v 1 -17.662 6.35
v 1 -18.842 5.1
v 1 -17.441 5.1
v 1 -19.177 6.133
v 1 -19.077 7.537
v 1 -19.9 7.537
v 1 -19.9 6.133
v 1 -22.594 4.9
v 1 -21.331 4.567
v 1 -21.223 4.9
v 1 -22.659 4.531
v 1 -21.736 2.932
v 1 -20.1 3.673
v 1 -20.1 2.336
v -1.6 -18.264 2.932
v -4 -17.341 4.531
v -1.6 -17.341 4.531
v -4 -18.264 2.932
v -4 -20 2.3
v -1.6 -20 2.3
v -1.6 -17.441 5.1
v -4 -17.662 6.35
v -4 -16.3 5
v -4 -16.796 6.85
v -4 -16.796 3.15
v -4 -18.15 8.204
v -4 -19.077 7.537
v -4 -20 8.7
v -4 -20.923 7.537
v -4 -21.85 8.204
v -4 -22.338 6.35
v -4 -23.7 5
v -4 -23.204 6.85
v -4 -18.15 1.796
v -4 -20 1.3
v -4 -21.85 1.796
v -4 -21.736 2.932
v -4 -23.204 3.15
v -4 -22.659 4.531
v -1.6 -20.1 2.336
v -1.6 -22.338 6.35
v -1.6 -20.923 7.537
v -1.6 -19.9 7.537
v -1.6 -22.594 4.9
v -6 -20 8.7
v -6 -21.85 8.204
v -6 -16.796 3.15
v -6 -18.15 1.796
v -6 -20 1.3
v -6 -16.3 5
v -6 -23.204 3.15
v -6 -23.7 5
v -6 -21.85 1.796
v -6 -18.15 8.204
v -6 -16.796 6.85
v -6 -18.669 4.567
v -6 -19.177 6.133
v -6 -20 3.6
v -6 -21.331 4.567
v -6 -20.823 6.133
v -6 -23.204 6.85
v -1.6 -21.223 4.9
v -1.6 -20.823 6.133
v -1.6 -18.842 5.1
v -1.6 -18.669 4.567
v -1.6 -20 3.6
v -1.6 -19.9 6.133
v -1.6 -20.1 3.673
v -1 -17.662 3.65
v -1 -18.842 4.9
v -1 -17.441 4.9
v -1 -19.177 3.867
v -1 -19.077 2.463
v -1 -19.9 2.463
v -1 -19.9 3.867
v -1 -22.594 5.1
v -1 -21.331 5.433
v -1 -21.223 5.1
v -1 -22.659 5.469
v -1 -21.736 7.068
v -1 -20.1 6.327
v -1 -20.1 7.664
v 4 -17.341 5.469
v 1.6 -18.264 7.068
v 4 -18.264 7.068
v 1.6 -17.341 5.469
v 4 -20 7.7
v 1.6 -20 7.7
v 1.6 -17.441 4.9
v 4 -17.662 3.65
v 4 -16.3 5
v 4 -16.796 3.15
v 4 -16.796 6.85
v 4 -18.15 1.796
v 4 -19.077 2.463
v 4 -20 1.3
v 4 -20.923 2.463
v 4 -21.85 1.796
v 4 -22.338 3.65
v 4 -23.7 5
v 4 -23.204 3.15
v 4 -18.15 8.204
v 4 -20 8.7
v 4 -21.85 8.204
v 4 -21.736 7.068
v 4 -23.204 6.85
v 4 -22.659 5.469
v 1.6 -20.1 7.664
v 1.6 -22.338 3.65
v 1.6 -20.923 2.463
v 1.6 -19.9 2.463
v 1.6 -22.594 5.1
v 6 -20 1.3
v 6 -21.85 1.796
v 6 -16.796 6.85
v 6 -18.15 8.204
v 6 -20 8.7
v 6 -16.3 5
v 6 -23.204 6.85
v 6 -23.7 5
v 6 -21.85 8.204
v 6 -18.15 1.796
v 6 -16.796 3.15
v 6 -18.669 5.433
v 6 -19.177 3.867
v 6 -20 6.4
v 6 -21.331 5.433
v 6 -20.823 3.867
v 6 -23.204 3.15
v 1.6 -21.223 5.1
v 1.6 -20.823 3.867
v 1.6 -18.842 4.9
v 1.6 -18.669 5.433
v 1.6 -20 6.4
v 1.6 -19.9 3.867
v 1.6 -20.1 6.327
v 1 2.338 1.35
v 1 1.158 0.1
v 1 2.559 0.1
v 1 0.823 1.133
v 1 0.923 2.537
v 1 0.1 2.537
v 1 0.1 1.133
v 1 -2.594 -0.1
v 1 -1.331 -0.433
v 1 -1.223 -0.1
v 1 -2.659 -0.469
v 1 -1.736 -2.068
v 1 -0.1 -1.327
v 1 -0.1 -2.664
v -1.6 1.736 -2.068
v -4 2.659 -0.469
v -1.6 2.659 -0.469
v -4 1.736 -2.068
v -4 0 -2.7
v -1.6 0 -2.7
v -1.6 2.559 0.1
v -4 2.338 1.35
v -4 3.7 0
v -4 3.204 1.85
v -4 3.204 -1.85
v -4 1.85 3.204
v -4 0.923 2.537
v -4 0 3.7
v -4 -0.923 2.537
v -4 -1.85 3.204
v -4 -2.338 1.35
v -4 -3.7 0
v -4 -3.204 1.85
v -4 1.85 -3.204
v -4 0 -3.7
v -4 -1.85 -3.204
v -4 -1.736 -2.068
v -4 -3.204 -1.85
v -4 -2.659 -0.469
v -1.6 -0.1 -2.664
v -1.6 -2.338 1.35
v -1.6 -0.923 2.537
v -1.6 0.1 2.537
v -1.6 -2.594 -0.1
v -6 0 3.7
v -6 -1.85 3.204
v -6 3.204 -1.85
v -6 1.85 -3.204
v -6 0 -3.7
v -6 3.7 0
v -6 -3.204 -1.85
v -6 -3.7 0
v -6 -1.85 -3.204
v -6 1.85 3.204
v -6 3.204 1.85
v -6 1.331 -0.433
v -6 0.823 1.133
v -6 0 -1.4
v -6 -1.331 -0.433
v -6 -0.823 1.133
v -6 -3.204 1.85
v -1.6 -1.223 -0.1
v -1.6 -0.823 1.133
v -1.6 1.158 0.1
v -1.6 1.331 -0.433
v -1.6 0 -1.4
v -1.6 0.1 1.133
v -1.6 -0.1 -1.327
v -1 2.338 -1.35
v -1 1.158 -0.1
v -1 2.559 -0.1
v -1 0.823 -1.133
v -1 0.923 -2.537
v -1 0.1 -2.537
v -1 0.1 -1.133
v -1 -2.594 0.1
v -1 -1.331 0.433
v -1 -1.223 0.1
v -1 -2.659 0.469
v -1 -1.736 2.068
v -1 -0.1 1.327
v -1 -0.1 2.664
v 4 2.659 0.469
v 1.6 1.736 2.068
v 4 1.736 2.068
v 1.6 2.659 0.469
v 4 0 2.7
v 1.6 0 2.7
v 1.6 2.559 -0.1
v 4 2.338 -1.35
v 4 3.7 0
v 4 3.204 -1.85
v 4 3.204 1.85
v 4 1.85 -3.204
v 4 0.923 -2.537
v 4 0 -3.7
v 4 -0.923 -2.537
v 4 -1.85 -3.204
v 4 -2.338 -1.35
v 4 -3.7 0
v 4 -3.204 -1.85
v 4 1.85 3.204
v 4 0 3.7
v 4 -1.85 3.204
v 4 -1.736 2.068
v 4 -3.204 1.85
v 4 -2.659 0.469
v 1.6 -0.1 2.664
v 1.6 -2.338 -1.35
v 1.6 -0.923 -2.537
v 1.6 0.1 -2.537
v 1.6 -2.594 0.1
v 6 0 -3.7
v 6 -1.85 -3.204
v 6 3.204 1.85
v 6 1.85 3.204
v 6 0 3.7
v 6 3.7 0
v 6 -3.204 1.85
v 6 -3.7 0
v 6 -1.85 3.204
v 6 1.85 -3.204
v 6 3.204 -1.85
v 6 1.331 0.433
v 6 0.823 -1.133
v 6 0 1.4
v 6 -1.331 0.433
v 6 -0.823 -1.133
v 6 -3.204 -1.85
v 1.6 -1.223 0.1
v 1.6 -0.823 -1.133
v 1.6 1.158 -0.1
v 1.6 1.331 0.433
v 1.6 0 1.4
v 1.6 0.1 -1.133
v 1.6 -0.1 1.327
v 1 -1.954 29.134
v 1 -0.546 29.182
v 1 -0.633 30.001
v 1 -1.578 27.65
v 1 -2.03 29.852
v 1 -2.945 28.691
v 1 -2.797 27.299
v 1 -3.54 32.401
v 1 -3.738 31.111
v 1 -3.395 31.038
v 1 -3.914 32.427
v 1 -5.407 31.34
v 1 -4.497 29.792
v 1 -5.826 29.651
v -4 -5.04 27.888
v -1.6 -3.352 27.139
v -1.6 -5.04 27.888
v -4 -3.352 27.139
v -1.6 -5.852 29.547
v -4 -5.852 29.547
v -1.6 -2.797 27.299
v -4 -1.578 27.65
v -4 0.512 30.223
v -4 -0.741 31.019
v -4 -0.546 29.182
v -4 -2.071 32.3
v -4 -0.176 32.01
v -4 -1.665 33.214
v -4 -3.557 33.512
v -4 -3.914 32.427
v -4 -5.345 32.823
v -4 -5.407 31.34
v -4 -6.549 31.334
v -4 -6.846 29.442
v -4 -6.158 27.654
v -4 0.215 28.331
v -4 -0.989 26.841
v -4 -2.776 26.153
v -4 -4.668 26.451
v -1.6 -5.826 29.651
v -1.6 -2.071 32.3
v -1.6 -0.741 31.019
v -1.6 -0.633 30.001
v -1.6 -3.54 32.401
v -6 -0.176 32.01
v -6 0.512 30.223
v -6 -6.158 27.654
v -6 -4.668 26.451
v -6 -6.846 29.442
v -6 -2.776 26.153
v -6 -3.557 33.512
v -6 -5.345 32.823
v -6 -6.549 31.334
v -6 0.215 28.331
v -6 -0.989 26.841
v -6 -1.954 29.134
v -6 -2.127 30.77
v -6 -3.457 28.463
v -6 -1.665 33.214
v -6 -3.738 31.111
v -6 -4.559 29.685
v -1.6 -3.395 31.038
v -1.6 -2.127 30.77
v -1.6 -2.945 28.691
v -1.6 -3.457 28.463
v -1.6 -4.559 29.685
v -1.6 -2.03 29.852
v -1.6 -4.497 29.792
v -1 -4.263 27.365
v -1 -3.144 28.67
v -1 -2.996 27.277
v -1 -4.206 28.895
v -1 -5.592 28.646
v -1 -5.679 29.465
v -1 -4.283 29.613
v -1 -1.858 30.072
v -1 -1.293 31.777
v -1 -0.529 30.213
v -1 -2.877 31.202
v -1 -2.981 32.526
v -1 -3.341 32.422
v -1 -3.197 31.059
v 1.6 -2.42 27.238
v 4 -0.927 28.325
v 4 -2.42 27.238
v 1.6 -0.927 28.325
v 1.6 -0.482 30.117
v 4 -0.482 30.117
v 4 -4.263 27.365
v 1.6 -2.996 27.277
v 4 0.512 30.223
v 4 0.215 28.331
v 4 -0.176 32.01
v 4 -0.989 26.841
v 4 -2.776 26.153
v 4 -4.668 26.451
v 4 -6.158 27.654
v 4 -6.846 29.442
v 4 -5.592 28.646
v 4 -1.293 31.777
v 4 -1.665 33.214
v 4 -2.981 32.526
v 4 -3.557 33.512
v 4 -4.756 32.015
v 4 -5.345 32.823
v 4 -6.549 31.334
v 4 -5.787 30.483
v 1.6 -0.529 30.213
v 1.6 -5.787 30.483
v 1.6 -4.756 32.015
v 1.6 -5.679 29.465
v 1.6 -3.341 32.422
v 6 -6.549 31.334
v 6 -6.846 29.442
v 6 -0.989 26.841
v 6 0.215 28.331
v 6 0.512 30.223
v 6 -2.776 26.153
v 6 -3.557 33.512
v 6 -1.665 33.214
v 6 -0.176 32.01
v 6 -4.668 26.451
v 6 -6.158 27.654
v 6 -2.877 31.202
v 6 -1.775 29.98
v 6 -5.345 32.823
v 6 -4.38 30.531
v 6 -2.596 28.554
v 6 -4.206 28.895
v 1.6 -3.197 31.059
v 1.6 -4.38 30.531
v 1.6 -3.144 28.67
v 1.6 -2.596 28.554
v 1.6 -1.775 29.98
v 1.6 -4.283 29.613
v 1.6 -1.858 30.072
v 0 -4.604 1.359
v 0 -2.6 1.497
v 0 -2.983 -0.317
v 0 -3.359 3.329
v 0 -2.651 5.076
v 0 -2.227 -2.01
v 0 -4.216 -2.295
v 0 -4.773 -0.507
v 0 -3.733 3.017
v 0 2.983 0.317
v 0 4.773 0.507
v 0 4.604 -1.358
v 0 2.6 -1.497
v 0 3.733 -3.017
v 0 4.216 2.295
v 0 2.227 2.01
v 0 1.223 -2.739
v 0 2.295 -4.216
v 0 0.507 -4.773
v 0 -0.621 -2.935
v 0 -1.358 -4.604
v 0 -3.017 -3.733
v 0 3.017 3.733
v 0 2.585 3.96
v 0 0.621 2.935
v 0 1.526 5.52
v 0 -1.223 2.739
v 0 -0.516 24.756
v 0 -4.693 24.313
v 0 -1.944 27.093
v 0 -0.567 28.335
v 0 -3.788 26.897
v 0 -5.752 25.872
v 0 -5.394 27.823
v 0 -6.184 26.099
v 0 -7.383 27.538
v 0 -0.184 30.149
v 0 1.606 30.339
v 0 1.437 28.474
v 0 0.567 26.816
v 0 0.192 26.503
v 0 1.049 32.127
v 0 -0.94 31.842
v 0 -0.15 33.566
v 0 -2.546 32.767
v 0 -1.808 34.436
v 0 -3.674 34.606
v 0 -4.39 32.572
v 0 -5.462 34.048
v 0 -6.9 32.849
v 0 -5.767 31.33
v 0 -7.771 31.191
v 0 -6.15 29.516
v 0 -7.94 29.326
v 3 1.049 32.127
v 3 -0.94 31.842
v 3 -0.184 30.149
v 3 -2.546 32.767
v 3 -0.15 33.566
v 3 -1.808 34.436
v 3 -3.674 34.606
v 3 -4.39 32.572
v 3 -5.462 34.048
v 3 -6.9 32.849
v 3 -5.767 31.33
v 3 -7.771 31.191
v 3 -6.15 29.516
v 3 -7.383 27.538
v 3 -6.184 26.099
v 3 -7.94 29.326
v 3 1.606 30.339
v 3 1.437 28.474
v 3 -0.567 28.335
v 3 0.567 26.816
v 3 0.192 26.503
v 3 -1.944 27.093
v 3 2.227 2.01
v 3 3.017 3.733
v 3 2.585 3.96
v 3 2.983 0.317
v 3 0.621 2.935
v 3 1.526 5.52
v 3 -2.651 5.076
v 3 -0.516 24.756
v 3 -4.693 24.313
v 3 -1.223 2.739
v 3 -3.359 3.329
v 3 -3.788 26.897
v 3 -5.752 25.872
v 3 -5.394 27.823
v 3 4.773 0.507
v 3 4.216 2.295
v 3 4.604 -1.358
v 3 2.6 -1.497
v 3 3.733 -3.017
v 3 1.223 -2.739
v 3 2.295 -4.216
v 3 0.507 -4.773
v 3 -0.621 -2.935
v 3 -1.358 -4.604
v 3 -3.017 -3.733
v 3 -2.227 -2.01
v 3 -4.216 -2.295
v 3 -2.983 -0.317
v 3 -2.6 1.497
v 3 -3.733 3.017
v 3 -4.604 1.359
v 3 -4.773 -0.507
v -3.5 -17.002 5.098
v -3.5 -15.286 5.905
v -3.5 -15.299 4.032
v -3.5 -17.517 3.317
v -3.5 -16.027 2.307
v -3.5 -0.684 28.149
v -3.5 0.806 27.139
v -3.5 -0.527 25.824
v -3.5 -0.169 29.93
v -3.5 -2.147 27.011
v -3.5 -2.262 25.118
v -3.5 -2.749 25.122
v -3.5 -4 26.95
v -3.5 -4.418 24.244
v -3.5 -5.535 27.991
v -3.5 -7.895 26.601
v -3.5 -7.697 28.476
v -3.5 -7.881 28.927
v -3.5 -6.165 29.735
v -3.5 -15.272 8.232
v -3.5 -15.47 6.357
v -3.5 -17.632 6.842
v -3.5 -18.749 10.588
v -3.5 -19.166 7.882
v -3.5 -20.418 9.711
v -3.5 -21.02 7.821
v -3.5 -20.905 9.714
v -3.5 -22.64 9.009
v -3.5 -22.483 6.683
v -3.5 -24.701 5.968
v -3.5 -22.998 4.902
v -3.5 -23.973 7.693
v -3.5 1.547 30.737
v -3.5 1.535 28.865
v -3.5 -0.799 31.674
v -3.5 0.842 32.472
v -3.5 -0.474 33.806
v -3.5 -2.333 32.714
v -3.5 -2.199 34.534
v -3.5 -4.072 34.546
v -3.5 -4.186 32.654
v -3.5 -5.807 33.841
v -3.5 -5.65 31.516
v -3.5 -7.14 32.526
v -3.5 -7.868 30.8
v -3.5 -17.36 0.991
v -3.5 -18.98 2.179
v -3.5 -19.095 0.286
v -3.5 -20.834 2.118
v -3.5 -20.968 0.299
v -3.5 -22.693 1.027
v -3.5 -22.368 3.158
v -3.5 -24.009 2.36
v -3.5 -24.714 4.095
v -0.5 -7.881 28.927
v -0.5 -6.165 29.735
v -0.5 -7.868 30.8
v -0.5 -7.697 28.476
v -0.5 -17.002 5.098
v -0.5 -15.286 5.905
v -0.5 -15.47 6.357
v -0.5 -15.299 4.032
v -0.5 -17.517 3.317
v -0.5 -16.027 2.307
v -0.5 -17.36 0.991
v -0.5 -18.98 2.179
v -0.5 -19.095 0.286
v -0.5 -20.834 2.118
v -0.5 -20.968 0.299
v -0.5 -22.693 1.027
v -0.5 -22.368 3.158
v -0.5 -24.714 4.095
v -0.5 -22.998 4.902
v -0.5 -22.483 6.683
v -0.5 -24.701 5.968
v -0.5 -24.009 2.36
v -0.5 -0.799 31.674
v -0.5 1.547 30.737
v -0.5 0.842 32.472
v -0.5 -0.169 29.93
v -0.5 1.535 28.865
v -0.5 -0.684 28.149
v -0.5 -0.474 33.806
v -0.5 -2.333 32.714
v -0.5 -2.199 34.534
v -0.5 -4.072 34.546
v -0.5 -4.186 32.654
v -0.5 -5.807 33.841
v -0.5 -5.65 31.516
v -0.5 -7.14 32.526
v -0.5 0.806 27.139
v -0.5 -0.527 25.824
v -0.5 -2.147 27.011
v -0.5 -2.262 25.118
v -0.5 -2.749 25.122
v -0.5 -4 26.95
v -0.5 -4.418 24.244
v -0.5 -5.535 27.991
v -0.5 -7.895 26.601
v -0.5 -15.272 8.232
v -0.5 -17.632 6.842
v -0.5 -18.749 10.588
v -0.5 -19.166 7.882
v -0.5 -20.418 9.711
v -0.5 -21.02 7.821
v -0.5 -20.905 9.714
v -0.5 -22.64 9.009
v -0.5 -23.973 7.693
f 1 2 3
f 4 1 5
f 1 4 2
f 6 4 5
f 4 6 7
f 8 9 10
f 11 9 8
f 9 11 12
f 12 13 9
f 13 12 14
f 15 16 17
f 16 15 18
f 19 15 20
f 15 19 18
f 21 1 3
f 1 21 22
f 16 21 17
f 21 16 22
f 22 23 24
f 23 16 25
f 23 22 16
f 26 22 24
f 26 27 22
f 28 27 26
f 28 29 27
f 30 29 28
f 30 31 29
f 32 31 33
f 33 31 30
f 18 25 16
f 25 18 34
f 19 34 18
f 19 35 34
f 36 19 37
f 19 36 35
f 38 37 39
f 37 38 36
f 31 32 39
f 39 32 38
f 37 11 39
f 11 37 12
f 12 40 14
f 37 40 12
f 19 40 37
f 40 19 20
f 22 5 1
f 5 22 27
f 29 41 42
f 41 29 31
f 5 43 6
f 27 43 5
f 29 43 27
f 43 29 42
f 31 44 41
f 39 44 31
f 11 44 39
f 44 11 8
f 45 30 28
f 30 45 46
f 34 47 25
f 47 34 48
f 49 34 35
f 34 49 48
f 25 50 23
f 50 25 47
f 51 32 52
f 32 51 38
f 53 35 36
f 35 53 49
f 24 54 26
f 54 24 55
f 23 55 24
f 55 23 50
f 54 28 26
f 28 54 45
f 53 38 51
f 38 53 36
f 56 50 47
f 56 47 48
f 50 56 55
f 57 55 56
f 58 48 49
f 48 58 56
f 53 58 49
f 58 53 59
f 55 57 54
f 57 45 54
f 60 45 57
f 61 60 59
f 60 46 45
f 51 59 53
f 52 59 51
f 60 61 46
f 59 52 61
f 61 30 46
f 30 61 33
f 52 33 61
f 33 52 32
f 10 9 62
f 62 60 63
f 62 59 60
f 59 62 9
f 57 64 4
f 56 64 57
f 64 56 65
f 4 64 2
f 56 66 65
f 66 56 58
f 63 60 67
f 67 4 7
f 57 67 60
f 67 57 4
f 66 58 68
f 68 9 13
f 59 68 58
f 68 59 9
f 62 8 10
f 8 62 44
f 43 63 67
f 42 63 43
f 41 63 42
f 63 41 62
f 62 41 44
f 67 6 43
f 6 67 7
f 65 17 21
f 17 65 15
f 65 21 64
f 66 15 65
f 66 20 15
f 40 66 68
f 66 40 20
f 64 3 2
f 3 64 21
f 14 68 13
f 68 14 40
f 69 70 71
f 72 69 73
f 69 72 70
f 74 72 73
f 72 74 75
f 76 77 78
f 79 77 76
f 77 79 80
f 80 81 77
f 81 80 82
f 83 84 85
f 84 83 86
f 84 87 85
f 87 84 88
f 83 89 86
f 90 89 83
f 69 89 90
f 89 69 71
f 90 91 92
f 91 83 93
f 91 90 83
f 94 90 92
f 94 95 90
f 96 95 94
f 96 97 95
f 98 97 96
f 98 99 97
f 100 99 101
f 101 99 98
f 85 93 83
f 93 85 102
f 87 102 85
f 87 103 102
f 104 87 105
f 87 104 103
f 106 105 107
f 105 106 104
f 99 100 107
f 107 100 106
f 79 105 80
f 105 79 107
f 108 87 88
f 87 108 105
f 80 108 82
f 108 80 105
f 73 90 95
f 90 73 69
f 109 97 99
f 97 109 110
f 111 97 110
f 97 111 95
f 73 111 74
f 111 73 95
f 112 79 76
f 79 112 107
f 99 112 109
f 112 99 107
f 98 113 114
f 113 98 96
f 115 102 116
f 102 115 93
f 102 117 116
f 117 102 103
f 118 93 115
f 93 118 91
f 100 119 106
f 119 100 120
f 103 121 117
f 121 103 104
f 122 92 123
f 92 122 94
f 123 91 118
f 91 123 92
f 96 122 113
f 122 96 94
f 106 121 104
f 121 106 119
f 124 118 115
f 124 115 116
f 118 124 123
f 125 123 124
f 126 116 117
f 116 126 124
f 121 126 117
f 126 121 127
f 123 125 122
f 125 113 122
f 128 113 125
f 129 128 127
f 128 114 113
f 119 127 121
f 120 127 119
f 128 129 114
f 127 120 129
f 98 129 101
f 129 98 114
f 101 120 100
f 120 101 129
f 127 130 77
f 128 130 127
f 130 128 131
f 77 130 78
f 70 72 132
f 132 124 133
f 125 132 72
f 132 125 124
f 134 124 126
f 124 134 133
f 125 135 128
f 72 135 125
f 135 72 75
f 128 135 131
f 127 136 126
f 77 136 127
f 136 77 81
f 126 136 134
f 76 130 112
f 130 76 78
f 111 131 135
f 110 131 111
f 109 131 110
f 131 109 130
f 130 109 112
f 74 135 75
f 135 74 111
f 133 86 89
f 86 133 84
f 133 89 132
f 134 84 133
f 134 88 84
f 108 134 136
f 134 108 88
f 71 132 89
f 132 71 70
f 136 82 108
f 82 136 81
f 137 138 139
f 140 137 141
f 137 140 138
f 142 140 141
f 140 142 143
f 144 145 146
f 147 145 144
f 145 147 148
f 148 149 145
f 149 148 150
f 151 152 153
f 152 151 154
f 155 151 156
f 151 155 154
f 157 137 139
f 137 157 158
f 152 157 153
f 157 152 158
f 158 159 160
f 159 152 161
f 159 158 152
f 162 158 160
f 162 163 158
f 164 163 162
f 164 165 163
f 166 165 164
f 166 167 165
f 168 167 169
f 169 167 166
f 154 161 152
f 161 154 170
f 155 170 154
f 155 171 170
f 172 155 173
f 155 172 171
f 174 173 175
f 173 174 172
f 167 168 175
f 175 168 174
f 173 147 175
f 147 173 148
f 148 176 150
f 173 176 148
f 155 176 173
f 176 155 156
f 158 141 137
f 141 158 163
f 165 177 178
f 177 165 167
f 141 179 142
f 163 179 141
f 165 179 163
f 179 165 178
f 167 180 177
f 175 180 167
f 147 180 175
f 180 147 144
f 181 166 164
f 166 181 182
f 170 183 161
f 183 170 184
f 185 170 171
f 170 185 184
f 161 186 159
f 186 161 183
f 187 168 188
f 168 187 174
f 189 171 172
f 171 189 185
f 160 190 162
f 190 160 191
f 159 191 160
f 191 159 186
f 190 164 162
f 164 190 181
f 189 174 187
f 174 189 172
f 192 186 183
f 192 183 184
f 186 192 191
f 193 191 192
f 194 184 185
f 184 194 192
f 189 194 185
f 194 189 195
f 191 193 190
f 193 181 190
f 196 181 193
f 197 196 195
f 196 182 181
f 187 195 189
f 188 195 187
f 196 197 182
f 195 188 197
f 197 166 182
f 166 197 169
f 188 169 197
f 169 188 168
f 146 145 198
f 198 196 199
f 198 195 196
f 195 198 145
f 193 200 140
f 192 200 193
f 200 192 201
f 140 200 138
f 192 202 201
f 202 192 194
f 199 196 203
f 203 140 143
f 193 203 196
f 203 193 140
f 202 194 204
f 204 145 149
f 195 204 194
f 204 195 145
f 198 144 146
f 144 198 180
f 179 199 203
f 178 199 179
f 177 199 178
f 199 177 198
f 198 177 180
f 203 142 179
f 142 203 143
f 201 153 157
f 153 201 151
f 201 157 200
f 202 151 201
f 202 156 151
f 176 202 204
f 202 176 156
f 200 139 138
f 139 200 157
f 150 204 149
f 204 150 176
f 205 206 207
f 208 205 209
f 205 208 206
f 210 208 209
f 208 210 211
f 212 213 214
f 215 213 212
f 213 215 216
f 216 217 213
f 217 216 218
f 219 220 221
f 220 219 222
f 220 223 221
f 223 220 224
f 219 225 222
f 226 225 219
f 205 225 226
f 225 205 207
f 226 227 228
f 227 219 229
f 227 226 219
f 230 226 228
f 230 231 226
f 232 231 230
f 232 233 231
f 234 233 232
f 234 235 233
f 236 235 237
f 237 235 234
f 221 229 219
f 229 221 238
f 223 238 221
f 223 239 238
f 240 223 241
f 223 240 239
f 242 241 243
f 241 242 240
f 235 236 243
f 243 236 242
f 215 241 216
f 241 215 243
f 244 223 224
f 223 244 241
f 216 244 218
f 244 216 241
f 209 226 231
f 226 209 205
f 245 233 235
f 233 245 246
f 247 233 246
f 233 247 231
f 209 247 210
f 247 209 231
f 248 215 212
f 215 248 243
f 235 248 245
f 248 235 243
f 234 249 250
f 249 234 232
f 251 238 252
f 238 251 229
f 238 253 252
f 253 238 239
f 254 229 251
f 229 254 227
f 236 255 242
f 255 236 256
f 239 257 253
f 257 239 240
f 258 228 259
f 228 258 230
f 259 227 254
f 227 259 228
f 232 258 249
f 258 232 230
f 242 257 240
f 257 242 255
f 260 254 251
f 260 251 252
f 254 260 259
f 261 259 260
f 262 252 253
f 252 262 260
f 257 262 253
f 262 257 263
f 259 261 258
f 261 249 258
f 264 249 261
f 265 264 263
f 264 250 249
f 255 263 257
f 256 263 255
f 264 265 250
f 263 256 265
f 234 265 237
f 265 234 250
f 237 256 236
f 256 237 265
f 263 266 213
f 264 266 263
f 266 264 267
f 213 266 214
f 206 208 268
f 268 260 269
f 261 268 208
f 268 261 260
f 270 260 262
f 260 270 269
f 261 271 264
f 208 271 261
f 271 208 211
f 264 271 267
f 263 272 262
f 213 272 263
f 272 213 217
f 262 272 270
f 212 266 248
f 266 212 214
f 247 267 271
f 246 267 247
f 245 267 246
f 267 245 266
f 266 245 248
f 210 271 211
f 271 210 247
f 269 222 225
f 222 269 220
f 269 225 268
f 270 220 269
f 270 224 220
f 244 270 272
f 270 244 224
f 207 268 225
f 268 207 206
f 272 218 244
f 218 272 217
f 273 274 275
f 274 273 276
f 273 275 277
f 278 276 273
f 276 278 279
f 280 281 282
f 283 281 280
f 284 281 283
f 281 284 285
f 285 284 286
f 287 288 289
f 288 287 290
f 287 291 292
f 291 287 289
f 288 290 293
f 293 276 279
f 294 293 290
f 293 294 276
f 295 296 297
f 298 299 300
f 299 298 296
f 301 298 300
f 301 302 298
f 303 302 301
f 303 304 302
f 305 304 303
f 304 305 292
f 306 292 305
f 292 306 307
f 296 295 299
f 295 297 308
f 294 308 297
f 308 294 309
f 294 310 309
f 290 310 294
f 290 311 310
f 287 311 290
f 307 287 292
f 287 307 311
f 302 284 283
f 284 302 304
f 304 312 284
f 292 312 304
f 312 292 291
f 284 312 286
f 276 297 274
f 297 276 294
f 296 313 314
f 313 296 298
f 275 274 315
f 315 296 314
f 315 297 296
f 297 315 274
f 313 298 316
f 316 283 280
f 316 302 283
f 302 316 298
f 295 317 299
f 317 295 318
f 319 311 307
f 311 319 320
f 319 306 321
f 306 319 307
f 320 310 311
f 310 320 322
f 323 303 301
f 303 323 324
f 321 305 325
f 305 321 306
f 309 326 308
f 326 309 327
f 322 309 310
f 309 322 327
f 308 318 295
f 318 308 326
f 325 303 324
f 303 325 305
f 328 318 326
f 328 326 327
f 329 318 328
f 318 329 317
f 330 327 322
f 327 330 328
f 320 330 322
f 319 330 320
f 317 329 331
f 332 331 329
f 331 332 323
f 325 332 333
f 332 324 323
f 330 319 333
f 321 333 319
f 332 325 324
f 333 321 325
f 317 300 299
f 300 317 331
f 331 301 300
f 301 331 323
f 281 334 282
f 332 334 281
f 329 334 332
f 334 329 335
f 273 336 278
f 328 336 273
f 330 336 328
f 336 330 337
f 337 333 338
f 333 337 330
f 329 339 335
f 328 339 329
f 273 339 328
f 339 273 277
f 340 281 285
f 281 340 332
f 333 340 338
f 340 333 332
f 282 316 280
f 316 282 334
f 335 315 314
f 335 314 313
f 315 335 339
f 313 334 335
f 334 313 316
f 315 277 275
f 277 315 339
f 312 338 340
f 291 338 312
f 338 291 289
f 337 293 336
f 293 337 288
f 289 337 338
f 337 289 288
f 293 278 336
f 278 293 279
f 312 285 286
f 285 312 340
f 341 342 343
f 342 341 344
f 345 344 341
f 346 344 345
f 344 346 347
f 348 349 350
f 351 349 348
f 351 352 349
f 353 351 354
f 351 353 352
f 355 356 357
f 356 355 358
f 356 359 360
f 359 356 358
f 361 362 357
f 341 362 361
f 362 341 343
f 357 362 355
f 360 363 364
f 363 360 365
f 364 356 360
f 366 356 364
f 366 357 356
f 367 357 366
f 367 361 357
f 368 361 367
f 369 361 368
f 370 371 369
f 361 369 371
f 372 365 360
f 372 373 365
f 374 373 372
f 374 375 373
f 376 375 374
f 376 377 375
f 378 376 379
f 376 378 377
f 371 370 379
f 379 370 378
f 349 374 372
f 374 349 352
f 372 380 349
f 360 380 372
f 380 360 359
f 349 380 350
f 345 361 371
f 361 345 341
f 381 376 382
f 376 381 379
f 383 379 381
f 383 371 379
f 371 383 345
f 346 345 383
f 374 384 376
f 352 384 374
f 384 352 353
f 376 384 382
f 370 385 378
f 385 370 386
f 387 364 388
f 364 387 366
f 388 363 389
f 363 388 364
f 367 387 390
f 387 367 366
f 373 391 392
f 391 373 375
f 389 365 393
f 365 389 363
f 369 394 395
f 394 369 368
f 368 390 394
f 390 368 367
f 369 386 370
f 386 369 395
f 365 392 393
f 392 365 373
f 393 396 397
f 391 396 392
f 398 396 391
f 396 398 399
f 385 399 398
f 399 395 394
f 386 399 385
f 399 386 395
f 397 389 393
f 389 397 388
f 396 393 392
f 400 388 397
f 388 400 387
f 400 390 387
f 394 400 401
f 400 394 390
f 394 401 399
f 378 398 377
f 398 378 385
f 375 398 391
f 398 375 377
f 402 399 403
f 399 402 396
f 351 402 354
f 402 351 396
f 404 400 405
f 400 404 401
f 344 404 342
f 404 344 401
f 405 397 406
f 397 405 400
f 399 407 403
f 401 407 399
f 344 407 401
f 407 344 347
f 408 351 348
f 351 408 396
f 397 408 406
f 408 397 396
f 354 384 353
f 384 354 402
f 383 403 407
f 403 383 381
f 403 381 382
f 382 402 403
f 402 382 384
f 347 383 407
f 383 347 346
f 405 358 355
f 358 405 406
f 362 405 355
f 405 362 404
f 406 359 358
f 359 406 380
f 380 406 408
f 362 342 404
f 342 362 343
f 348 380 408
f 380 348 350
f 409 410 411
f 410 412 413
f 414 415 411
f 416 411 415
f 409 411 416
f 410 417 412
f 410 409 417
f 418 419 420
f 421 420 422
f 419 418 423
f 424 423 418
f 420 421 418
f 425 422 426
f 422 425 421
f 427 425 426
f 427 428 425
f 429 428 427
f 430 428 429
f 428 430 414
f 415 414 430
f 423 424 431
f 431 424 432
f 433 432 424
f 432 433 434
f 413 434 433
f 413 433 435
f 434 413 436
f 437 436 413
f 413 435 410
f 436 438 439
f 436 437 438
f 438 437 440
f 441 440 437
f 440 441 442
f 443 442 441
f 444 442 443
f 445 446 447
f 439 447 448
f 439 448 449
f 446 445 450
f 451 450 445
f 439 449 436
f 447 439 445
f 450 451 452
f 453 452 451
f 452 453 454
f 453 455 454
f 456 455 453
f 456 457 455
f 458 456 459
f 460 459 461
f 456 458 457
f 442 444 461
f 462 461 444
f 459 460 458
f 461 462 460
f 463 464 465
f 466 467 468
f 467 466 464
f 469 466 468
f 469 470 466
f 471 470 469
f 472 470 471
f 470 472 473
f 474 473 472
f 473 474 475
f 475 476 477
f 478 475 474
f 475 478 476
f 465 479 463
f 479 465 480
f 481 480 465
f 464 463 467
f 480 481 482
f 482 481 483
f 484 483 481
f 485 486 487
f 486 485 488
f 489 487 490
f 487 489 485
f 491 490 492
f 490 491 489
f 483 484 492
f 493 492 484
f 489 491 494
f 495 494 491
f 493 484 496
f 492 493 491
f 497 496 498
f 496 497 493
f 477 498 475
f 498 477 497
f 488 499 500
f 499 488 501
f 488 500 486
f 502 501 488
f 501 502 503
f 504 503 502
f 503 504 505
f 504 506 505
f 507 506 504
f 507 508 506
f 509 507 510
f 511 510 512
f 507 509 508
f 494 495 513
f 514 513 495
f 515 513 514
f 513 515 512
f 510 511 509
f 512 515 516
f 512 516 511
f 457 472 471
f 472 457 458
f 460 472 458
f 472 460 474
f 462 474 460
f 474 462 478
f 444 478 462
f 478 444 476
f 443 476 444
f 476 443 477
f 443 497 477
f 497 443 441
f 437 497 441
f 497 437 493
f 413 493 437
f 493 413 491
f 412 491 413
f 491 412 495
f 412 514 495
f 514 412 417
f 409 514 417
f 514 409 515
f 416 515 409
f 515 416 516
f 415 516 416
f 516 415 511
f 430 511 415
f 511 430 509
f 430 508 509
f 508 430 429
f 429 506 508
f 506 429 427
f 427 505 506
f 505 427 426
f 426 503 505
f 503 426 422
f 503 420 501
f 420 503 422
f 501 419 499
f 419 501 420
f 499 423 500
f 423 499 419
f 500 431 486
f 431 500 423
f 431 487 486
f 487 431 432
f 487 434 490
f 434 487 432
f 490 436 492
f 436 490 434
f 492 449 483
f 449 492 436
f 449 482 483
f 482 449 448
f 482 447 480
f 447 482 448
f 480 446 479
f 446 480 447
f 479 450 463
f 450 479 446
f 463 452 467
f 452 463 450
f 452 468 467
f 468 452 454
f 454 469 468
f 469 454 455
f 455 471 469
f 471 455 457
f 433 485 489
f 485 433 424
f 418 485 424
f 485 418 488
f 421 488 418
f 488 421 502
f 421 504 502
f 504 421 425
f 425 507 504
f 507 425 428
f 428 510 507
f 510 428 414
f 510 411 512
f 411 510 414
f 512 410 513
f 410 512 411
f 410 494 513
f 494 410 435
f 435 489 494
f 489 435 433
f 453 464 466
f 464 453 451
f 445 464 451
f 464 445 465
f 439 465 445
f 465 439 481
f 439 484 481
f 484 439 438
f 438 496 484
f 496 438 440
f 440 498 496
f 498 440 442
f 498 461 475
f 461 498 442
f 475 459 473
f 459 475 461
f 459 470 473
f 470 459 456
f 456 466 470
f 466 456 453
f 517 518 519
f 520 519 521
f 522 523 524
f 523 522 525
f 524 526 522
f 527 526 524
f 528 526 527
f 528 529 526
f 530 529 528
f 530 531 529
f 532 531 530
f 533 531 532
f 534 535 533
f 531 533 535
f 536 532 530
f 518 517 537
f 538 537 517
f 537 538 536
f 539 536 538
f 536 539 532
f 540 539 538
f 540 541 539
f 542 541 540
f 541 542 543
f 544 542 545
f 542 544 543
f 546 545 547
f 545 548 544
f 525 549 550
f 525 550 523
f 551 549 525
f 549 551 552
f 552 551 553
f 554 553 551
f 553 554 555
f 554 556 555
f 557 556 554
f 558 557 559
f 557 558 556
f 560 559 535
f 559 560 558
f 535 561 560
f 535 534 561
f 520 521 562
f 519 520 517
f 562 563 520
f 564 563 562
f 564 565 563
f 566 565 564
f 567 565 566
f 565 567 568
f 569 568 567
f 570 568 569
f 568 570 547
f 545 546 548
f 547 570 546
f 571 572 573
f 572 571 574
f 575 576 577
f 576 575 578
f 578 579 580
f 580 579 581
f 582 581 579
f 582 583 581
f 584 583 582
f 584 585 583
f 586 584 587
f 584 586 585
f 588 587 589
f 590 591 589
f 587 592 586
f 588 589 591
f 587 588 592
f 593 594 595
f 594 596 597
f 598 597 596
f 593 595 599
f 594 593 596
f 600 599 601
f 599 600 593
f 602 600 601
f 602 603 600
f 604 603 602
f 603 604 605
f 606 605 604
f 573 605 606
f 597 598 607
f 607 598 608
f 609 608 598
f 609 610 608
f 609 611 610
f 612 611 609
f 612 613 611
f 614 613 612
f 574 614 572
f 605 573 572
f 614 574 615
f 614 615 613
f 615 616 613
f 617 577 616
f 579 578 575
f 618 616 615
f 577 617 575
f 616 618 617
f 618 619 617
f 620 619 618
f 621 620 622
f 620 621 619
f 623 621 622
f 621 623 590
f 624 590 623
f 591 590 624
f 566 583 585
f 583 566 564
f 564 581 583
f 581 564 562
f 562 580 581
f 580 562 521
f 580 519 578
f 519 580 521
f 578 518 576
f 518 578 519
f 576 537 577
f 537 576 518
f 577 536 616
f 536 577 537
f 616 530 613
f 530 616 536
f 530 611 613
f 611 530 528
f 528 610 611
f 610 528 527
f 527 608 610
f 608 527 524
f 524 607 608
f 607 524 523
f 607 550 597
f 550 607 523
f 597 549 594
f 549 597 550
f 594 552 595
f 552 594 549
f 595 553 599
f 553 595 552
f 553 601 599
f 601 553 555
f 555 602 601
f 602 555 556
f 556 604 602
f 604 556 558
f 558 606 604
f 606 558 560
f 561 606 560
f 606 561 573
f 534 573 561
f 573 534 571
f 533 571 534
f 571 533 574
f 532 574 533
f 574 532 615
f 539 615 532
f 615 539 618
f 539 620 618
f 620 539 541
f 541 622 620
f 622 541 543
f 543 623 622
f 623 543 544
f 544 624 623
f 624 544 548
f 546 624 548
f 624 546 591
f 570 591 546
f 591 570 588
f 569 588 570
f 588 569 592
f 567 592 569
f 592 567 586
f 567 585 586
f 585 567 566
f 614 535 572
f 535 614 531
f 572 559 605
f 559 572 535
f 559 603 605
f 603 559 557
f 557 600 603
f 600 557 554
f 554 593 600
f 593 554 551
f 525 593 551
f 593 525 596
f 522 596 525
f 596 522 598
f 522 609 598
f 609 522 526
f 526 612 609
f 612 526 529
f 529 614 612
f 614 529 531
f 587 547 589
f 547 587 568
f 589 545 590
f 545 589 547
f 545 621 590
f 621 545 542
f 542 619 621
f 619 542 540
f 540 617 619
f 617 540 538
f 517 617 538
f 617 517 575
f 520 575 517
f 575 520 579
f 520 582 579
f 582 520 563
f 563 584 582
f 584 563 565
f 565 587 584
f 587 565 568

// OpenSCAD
// file: arm_holder.scad
module arm_holder(external_radius, internal_radius, width, tolerence)
{
    union()
    {
        scale(v = [1, 1, 2]) union() {
            difference() {
                cube(size = [external_radius, external_radius, width]);
                translate(v = [0, 0, width/2]) cylinder(h = width*2, r = external_radius, center = true);
            }
            translate(v = [0, external_radius*2, 0]) mirror(v = [0, 1, 0])  difference() {
                cube(size = [external_radius, external_radius, width]);
                translate(v = [0, 0, width/2]) cylinder(h = width*2, r = external_radius, center = true);
            }
        }

        difference()
        {
            translate(v = [0, 0, width/2]) cylinder(h = width, r = external_radius, center = true);
            cylinder(h = 13, r = internal_radius, center = true);
        }
    }
}


rotate(a = 90, v = [0, 1, 0]) arm_holder(5, 3, 4, .1);
// file: link.scad
use <arm_pins.scad>
use <arm_holder.scad>

module link(lenght, external_radius, internal_radius, width)
{
    linear_extrude(height = width)
    {
        difference() {
            offset(r=-2) {
                offset(delta=2) {
                    union() {
                        translate(v = [0, -lenght/2, 0]) circle(r = external_radius+2);
                        translate(v = [0, lenght/2, 0])circle(r = external_radius+2);
                        square(size = [external_radius*1.5, lenght], center=true);
                    }
                    circle(r = 2);
                }
            }
            union() {
                translate(v = [0, -lenght/2, 0]) circle(r = internal_radius);
                translate(v = [0, lenght/2, 0]) circle(r = internal_radius);
            }
        }
    } 
}

rotate(a = 90, v = [1, 0, 0]) union() 
{
    !link(20, 2.8, 3, 3)
    link(20, 2.8, 3, 3);
    translate(v = [0, -20, 2]) arm_pin(5, 2.7);
    translate(v = [0, -20, 7]) rotate(a = 180, v = [1, 0, 0])  rotate(a = 90, v = [0,0,1]) arm_holder(5, 3, 3.5, .1);
}
// file: arm_pins.scad
use <arm_holder.scad>

module arm_pin(height, radius, hat_radius)
{
    difference()
    {
        union()
        {
            cylinder(h = height, r = radius, center = true);
            translate(v = [ 0, 0, -height / 2 - 1 ]) cylinder(h = 2, r = hat_radius, center = true);
        }
        cylinder(h = 20, r = 1.4, center = true);
        translate(v = [ -2, -2, 2 ]) cube(size = 4.2, center = true);
        translate(v = [ 2, 2, 2 ]) cube(size = 4.2, center = true);
    }
}

arm_pin(3.5, 2.7, 3.7);
// main file
use <arm_pins.scad>
use <link.scad>

// Atrocity found with wolframalpha
// solve for threta: l=(m*cos(θ) + n*cos(arcsin((m*sin(θ)+a)/n)))
// clang-format off

function _elie_angle(m, n, a, l) = (
    acos((-a*a+l*l+m*m+n*n)/(2*sqrt(a*a+l*l)*m)) + tan(a/l)
);

// function _elie_angle(m, n, a, l) = (
//     acos((m*m-a*a-l*l-n*n)/(2*sqrt(a*a+l*l)*m)) + tan(a/l)
// );

function _static_arm_angle(m, n, a, l) = (
    acos(
        (
            1/(
                2*(a*a*m*m + l*l*m*m)
            )
            *
            (
                a*a*l*m
                - sqrt(
                    pow(a, 6)*(-(m*m))
                    - 2*pow(a, 4)*l*l*m*m
                    + 2*pow(a, 4)*pow(m, 4)
                    + 2*pow(a, 4)*m*m*n*n
                    - a*a*pow(l, 4)*m*m
                    + 2*a*a*l*l*pow(m, 4)
                    + 2*a*a*l*l*m*m*n*n
                    - a*a*pow(m, 6)
                    + 2*a*a*pow(m, 4)*n*n
                    - a*a*m*m*pow(n, 4)
                )
                + pow(l, 3)*m
                + l*pow(m, 3)
                - l*m*n*n
            )
        )
    )
);
function static_arm_angle(arm1_length, arm2_length, arm_2_offset, distance) = (
    _static_arm_angle(arm1_length, n = arm2_length, a = arm_2_offset, l = distance)
);

function complementary_angle(arm1_length, arm2_length, arm_2_offset, angle1) = (
    asin(
        (
            arm1_length * sin(angle1) - arm_2_offset
        )
        /
        arm2_length
    )
);
// clang-format on

module two_arm_pins()
{
    translate(v = [ 0, 0, -1.5 ]) arm_pin(5, 2.7, 3.7);
    translate(v = [ 0, 0, 1.5 ]) rotate(a = 180, v = [ 0, 1, 0 ]) arm_pin(5, 2.7, 3.7);
}

module moving_arm(distance, _offset, arm_l_1, arm_l_2)
{

    angle1 = static_arm_angle(arm_l_1, arm_l_2, _offset, distance);
    // angle1 = _elie_angle(arm_l_1, arm_l_2, _offset, distance);

    angle2 = complementary_angle(arm_l_1, arm_l_2, _offset, angle1);

    color("Coral") rotate(a = 90, v = [ 0, 1, 0 ]) //
        translate(v = [ -_offset, -distance, 0 ])  //
        two_arm_pins();
    color("Coral") rotate(a = 90, v = [ 0, 1, 0 ]) //
        two_arm_pins();
    color("Coral") rotate(a = angle1, v = [ -1, 0, 0 ]) //
        translate(v = [ 0, -(arm_l_1), 0 ])             //
        rotate(a = 90, v = [ 0, 1, 0 ])                 //
        two_arm_pins();
    color("green") rotate(a = angle1, v = [ -1, 0, 0 ]) //
        rotate(a = 90, v = [ 0, 1, 0 ])                 //
        translate(v = [ 0, -(arm_l_1 / 2), 0 ])         //
        link(arm_l_1, 2.8, 3, 3);
    color("green") translate(v = [ 0, -distance, _offset ]) rotate(a = angle2, v = [ 1, 0, 0 ])
        rotate(a = 90, v = [ 0, 1, 0 ])           //
        translate(v = [ 0, (arm_l_2 / 2), -3.5 ]) //
        link(arm_l_2, 2.8, 3, 3);
}

moving_arm(20 + (9 * (sin($t * 360))), 5, 30, 30);
